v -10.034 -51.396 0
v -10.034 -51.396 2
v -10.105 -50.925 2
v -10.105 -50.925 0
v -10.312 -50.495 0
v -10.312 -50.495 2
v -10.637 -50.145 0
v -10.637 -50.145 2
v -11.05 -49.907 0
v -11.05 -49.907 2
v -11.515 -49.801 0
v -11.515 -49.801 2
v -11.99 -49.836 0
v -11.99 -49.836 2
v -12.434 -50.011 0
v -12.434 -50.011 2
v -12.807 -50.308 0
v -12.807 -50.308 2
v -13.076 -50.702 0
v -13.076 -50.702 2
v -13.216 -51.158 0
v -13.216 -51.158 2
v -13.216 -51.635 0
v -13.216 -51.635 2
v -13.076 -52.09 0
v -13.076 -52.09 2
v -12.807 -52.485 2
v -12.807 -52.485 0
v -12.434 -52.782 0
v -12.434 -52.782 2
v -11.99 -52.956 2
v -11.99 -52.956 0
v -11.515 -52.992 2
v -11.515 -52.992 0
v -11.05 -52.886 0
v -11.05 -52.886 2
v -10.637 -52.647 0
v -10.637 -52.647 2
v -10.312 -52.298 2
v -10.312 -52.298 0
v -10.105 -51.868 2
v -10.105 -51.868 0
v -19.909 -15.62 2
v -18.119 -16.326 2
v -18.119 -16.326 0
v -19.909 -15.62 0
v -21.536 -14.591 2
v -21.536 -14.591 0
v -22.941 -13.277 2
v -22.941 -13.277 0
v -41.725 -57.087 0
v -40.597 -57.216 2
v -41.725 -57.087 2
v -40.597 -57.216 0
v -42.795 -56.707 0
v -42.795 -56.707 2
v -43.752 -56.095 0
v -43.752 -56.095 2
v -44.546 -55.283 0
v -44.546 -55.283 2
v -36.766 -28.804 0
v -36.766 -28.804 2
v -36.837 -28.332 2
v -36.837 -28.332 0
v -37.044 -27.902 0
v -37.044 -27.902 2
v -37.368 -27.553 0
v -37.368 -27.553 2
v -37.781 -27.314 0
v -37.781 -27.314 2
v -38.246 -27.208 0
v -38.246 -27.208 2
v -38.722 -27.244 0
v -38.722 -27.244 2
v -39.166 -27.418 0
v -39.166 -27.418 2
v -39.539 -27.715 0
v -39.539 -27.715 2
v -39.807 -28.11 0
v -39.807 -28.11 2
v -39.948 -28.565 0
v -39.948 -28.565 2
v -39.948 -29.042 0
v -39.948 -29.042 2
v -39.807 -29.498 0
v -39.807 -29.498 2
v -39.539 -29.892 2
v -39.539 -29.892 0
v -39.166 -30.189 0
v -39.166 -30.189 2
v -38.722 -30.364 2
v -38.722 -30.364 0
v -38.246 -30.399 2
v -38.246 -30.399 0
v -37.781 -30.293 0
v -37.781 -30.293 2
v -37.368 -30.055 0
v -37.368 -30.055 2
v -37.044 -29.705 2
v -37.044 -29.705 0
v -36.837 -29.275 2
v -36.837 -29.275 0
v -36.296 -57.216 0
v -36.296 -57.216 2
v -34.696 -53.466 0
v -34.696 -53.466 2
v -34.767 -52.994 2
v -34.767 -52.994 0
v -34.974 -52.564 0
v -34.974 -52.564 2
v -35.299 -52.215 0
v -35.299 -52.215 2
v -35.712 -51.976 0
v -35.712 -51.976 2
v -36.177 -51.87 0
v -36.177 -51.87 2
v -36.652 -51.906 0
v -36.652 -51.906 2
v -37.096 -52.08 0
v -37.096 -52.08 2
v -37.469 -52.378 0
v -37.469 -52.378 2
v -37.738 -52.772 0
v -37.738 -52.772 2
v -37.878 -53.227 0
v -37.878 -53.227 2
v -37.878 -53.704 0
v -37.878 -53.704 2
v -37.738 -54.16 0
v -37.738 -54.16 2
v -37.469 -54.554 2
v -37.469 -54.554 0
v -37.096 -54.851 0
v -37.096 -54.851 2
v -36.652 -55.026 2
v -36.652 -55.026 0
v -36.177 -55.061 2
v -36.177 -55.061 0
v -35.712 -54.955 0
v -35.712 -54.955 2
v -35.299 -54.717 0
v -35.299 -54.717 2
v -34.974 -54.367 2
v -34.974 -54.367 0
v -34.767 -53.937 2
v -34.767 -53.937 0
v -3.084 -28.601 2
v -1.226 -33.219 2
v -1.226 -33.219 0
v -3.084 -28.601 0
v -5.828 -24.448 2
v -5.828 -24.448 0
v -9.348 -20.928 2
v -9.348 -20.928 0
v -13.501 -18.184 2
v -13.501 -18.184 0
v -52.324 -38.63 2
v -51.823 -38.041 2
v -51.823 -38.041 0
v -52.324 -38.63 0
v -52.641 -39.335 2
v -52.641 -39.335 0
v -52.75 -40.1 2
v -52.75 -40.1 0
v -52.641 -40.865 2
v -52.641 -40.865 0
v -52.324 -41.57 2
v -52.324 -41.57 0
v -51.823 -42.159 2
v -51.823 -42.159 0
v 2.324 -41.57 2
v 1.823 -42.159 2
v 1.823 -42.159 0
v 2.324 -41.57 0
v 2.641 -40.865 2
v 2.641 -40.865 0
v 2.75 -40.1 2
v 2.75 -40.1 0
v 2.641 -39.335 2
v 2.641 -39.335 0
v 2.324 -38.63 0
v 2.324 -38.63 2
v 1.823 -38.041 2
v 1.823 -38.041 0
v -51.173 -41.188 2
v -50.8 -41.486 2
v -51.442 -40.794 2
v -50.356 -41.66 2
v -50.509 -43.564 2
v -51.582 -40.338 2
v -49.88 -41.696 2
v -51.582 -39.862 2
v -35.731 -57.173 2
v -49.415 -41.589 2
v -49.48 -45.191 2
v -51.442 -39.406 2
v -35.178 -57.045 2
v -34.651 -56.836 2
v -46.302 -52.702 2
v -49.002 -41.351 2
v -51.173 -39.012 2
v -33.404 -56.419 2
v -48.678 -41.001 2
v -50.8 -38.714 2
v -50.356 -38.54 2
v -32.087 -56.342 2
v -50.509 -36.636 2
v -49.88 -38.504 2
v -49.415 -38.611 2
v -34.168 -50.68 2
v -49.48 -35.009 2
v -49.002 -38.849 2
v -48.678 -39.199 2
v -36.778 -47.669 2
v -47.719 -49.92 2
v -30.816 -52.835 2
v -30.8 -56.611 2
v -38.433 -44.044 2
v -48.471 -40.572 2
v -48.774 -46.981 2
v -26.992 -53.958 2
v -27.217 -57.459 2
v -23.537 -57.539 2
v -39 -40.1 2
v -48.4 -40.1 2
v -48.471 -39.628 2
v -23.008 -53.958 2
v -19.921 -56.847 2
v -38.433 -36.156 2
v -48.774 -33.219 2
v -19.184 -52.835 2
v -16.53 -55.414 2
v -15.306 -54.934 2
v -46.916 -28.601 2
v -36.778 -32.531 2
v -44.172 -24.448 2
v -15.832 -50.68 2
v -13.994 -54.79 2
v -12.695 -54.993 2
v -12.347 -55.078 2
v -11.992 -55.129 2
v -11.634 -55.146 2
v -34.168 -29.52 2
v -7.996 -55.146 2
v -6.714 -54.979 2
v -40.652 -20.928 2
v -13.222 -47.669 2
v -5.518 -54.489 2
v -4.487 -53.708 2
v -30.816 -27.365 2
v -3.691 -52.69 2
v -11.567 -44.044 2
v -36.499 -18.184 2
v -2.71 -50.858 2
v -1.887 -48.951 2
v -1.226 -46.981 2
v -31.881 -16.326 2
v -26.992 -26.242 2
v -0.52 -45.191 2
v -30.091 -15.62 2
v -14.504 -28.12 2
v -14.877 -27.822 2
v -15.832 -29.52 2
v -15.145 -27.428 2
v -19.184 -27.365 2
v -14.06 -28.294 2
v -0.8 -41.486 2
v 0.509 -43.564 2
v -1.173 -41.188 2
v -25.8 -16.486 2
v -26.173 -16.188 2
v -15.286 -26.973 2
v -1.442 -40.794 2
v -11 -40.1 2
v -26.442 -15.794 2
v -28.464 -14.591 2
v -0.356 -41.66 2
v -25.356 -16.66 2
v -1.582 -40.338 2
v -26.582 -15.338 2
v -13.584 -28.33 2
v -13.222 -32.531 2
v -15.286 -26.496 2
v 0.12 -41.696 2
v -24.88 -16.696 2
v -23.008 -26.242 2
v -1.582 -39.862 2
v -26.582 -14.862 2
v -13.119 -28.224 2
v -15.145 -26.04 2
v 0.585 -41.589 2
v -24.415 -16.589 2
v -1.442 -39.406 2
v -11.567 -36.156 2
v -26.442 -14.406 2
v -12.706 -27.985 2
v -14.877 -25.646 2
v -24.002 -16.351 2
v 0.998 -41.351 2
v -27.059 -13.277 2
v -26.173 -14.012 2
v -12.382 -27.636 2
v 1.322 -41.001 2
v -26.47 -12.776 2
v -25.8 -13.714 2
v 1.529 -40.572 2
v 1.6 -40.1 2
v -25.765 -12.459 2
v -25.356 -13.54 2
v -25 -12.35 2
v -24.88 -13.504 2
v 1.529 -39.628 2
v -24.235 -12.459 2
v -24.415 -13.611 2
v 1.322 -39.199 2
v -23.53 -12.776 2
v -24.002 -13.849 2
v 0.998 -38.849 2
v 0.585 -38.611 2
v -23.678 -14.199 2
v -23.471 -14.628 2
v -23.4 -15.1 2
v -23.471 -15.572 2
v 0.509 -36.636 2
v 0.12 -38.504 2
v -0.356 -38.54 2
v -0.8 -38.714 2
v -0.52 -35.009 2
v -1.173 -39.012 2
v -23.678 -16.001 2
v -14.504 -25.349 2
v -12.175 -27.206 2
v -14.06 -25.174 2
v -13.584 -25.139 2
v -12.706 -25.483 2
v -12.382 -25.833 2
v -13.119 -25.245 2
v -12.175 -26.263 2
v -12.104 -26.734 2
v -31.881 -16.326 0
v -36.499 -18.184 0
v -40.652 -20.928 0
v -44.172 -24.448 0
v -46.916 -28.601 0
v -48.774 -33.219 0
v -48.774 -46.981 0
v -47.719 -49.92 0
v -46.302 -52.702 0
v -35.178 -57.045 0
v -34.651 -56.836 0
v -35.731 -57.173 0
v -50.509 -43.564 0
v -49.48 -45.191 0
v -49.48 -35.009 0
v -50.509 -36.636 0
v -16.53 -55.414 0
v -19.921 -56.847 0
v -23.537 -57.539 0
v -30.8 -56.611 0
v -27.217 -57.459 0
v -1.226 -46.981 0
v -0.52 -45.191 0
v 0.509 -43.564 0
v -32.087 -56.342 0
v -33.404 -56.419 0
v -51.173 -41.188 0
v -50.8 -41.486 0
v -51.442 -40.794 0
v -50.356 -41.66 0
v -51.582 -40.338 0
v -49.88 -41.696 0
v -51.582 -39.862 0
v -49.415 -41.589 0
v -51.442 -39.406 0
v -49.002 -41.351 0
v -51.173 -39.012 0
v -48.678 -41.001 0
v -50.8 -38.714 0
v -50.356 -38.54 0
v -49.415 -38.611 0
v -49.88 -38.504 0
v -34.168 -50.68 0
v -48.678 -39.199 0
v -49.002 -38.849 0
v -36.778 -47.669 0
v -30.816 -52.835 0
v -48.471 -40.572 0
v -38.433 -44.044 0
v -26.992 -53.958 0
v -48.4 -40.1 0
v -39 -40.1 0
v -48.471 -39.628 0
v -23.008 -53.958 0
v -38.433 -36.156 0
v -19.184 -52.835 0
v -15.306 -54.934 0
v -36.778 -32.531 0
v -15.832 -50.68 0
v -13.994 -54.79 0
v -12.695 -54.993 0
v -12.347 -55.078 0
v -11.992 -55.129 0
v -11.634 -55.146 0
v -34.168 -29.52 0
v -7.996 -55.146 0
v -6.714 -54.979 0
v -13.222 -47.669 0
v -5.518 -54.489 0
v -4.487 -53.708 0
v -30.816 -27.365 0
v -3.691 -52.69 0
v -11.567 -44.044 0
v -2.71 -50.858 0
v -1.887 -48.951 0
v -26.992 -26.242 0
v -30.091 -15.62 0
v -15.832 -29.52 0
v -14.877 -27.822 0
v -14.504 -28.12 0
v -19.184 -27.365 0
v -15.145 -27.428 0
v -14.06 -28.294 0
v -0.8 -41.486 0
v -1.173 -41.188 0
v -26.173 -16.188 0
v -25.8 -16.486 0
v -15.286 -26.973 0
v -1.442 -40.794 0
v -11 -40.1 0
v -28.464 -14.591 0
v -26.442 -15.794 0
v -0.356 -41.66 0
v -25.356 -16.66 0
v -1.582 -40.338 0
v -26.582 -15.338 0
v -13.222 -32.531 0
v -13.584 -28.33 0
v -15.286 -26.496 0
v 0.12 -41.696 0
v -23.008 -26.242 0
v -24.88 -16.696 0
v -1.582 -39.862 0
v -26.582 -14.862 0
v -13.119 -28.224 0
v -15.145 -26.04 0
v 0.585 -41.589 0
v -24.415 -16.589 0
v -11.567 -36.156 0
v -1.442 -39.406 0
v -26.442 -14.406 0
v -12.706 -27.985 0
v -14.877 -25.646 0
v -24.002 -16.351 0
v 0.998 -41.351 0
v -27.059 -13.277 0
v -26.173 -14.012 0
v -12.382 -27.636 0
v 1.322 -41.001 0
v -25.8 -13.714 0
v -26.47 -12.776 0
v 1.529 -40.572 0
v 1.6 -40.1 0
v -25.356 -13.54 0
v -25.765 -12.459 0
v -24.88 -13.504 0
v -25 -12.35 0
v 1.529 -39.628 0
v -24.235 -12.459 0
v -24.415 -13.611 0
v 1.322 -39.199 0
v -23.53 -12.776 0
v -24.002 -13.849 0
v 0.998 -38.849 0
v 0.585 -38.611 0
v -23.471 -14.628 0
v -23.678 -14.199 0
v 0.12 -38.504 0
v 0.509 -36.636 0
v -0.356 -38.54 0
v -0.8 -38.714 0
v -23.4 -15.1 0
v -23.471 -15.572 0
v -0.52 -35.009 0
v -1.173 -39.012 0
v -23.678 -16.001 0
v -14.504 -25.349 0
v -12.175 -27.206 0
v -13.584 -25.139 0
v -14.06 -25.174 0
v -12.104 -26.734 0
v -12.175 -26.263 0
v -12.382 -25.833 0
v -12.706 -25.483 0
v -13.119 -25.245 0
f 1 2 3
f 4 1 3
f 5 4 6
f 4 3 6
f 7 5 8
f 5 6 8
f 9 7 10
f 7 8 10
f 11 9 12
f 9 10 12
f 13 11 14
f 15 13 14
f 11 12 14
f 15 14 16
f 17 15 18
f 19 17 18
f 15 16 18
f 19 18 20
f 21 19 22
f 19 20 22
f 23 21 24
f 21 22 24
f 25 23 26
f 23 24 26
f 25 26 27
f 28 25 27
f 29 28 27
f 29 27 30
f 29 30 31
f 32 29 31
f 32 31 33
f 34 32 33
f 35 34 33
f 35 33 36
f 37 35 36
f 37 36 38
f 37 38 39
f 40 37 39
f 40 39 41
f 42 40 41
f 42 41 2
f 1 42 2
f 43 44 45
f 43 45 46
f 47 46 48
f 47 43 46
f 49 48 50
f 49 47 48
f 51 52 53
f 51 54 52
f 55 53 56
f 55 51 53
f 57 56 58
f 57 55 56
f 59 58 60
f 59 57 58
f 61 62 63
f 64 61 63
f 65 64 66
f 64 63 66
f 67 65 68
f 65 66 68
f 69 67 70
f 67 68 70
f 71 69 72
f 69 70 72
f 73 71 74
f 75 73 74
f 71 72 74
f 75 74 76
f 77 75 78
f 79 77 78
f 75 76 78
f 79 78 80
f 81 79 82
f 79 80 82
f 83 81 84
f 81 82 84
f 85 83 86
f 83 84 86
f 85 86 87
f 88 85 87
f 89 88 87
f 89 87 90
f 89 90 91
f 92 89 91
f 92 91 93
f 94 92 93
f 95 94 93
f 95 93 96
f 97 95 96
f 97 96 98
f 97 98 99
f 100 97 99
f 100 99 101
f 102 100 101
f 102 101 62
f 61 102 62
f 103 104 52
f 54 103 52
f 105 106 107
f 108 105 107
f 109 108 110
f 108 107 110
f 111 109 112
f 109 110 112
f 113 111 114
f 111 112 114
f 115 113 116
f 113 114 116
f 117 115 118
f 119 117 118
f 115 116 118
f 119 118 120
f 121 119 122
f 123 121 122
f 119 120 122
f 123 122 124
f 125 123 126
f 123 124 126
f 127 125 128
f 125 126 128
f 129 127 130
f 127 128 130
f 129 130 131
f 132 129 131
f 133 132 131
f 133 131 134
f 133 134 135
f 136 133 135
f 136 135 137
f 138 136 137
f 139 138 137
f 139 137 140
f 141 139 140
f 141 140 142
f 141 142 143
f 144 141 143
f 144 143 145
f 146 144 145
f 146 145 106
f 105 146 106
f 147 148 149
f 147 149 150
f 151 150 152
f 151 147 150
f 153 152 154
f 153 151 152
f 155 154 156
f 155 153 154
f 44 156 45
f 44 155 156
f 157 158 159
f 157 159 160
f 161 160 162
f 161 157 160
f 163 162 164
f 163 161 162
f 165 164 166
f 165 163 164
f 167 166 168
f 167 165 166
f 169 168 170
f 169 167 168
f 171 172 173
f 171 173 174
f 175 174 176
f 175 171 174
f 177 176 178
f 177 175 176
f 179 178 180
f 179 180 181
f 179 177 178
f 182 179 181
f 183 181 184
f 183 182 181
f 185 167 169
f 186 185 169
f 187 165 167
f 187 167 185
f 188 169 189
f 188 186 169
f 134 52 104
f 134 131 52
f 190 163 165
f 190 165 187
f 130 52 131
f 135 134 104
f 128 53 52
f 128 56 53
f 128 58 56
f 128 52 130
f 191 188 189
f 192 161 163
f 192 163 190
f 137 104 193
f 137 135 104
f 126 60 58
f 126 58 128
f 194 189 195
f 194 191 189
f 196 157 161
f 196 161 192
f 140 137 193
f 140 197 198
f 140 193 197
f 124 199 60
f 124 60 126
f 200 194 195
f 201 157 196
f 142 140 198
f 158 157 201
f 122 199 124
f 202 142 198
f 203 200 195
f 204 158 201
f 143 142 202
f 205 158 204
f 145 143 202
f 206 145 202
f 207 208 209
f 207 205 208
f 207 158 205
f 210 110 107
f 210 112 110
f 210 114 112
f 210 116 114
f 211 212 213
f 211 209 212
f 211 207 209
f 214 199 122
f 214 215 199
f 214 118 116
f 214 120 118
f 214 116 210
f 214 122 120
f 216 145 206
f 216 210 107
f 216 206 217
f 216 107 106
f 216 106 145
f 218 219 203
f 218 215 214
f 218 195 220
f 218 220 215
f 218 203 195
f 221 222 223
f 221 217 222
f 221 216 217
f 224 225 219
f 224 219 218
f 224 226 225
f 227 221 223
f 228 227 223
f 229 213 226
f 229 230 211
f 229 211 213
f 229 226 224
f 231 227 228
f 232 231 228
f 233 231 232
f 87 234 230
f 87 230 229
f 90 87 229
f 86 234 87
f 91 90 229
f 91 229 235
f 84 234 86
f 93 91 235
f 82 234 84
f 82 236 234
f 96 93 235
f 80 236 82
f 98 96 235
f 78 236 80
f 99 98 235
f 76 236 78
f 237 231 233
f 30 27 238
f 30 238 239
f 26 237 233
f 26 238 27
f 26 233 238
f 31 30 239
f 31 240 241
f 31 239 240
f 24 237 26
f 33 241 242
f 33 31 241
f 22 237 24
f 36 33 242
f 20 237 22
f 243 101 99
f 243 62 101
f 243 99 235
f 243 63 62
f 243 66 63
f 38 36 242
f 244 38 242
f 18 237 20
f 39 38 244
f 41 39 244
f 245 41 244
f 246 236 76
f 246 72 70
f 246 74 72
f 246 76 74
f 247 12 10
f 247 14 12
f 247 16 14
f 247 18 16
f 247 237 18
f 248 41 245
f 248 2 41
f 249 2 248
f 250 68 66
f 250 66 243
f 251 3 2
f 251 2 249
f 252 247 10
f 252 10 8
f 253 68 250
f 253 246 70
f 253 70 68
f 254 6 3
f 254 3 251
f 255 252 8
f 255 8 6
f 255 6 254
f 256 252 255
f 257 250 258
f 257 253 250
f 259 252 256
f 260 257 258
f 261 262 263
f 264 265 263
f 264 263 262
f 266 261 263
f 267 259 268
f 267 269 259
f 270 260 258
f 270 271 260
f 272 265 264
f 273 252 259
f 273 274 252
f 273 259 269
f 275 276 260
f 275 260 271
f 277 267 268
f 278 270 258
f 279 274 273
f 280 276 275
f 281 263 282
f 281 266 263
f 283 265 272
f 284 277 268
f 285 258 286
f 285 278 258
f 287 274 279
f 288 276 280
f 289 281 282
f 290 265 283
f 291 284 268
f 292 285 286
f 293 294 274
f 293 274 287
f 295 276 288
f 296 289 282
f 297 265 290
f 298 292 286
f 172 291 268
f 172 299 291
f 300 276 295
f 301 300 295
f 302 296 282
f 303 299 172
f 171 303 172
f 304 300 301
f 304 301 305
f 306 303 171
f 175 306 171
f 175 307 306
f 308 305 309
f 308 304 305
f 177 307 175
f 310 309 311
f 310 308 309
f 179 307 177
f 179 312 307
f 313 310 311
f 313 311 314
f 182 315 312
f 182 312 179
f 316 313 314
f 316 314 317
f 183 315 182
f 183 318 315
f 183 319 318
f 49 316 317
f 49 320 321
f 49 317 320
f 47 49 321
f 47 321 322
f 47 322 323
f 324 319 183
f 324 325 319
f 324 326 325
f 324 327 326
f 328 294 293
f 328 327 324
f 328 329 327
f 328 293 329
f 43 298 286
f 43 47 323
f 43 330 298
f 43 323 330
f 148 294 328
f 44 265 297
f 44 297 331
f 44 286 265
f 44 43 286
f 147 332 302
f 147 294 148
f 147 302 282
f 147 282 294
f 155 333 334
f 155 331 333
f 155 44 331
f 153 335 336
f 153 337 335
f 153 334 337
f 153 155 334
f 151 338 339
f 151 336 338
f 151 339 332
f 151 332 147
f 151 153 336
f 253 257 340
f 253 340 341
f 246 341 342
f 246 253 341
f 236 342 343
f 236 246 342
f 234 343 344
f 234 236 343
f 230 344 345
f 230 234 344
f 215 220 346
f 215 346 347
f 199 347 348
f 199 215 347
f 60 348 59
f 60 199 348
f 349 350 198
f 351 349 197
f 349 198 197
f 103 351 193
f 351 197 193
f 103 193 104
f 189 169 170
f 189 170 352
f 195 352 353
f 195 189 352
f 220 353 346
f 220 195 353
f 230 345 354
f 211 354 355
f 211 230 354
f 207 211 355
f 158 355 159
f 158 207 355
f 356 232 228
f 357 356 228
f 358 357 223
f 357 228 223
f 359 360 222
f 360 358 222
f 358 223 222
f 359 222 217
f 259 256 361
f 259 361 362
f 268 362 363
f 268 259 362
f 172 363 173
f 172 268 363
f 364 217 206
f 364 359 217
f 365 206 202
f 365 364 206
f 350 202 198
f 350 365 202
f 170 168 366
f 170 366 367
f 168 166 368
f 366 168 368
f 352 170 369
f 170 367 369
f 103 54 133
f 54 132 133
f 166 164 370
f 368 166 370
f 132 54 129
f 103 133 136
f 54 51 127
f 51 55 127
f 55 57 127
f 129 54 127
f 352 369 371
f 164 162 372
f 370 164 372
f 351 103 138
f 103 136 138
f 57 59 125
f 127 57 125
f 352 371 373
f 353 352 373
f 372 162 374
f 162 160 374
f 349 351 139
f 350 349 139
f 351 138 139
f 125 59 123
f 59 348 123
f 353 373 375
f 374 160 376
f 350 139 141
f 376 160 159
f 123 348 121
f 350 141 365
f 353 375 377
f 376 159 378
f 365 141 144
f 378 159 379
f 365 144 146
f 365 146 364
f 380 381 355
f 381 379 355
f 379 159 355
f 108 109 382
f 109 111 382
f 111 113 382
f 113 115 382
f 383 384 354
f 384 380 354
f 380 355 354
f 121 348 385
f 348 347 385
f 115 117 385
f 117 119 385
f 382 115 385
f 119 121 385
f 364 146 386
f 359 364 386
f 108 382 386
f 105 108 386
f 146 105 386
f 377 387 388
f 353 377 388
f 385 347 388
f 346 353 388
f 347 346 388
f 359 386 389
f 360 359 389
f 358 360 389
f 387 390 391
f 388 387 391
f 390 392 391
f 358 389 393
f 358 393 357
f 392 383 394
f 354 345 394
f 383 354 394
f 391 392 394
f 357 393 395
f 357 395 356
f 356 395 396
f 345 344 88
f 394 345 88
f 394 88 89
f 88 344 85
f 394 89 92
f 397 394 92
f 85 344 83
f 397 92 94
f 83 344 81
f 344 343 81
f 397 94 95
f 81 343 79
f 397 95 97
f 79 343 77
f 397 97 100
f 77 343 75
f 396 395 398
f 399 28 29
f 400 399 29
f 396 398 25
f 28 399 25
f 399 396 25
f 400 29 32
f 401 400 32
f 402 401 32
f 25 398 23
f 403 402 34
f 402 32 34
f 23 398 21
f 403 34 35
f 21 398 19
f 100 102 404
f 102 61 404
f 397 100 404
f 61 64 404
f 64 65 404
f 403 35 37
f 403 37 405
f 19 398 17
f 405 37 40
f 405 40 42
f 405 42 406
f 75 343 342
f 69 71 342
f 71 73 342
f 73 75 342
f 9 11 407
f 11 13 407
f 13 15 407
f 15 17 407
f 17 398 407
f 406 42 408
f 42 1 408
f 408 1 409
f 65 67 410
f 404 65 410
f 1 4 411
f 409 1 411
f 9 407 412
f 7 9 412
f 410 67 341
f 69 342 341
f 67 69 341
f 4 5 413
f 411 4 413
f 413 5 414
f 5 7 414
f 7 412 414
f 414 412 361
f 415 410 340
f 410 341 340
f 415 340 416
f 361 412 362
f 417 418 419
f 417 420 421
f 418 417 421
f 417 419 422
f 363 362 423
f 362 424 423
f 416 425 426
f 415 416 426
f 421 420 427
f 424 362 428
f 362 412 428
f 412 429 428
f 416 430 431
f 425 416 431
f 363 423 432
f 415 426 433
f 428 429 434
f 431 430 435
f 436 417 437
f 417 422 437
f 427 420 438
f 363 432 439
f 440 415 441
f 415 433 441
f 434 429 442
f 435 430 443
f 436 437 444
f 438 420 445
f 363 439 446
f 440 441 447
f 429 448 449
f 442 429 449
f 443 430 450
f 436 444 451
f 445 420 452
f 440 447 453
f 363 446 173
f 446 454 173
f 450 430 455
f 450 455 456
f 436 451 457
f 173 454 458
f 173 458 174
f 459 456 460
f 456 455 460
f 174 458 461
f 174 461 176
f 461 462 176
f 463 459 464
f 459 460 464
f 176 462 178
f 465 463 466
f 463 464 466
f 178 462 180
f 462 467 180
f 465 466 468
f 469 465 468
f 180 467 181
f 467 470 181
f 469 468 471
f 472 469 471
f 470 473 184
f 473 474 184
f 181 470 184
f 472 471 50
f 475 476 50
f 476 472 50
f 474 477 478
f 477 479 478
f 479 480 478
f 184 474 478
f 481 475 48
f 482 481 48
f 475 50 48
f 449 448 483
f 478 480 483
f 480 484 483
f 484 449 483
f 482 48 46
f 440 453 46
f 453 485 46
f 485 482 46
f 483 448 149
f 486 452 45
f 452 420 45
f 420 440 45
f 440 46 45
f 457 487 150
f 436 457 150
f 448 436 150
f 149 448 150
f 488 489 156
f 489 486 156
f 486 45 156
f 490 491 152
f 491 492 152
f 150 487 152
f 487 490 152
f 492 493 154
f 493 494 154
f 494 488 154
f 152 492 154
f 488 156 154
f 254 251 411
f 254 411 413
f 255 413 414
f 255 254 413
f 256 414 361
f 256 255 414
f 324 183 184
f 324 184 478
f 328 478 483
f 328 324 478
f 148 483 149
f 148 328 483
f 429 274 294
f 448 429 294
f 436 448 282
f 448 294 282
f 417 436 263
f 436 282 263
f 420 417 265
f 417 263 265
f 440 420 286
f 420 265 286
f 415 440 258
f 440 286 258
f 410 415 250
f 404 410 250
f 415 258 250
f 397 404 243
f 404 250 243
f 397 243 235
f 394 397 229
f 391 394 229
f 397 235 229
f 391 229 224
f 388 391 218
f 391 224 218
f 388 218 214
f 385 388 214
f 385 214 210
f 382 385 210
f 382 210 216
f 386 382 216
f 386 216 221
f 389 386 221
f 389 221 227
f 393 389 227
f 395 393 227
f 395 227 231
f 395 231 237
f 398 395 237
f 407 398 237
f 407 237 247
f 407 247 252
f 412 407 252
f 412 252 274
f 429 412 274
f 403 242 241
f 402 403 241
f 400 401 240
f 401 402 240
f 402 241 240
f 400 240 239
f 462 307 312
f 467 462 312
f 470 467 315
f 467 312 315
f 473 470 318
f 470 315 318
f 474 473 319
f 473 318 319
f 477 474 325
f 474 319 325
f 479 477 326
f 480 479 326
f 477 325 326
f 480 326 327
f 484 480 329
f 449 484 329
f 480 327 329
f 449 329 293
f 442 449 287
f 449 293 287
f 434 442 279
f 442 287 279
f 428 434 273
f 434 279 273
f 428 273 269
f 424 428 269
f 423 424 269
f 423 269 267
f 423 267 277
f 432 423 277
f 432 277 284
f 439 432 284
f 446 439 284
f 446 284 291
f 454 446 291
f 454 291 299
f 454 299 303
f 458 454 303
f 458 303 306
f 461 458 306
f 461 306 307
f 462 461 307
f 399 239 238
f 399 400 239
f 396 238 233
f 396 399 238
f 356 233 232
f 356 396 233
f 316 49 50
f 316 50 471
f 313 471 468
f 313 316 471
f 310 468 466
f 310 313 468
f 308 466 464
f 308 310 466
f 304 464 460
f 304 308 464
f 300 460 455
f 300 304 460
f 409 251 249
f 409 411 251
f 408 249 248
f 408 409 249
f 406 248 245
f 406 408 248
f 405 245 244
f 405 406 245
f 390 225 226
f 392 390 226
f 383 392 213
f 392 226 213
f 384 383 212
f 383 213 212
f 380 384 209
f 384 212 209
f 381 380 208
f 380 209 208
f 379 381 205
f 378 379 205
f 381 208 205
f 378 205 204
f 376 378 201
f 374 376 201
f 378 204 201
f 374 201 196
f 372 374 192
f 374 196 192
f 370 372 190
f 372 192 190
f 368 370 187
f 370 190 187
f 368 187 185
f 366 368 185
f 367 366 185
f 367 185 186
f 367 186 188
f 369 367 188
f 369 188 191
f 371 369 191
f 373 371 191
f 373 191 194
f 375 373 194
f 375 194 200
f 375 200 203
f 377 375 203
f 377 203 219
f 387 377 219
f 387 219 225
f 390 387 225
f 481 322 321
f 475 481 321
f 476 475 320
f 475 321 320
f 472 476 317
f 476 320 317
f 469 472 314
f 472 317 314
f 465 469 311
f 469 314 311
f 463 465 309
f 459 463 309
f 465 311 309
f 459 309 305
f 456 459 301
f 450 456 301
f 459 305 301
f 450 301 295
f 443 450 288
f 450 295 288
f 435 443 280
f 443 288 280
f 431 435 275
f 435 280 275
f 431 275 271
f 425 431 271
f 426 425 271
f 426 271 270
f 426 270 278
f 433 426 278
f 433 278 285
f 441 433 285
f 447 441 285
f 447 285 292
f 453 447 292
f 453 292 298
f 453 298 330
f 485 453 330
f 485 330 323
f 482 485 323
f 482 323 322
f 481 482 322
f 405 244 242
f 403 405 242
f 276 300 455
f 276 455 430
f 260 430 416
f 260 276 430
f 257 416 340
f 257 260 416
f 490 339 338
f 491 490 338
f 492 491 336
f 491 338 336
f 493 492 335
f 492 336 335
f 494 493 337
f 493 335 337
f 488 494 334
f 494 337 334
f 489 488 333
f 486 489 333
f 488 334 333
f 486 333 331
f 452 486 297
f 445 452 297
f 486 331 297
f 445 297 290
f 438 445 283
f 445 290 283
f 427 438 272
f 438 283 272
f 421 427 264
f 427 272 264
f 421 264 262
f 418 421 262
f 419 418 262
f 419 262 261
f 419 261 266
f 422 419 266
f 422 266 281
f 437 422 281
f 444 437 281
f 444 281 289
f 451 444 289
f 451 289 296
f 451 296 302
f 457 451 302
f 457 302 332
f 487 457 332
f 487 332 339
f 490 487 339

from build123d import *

# Parameters (mm, degrees)
SKETCH1_R           = 25
SKETCH1_R_2         = 3
BOSS_EXTRUDE1_DEPTH = 2
FILLET1_R           = 10
CUT_EXTRUDE1_DEPTH  = 3.0000001
SKETCH4_R           = 1.6
SKETCH4_R_2         = 14
CUT_EXTRUDE2_DEPTH  = 3.0000001
SKETCH6_R           = 1.6
CUT_EXTRUDE3_DEPTH  = 3.0000001
SKETCH7_OUTSIDE_W   = 73.426
SKETCH7_OUTSIDE_H   = 70.426
CUT_EXTRUDE4_DEPTH  = 10
CUT_EXTRUDE5_DEPTH  = 10
FILLET2_R           = 5


with BuildPart() as part:
    # Sketch1 → Boss-Extrude1 (new body)
    with BuildSketch(Plane.XY):
        with Locations((-25, -40.1)):
            Circle(SKETCH1_R)
        with Locations((-50, -40.1)):
            Circle(SKETCH1_R_2)
        with Locations((-50, -40.1)):
            Circle(SKETCH1_R_2)
        with Locations((-25, -40.1)):
            Circle(SKETCH1_R)
        with Locations((0, -40.1)):
            Circle(SKETCH1_R_2)
        with Locations((-25, -40.1)):
            Circle(SKETCH1_R)
        with Locations((-25, -15.1)):
            Circle(SKETCH1_R_2)
        with Locations((-50, -40.1)):
            Circle(SKETCH1_R_2)
        with Locations((-25, -40.1)):
            Circle(SKETCH1_R)
        with Locations((-25, -15.1)):
            Circle(SKETCH1_R_2)
        with Locations((-25, -15.1)):
            Circle(SKETCH1_R_2)
        with Locations((-25, -40.1)):
            Circle(SKETCH1_R)
        with Locations((-25, -40.1)):
            Circle(SKETCH1_R)
        with Locations((0, -40.1)):
            Circle(SKETCH1_R_2)
        with Locations((0, -40.1)):
            Circle(SKETCH1_R_2)
        with Locations((-25, -40.1)):
            Circle(SKETCH1_R)
    extrude(amount=BOSS_EXTRUDE1_DEPTH)

    # Fillet1
    fillet1_edges = [part.edges().sort_by_distance(p)[0] for p in [
        (-49.82, -37.105404869, 1),
        (-27.994595131, -15.28, 1),
        (-22.005404869, -15.28, 1),
        (-0.18, -37.105404869, 1),
        (-0.18, -43.094595131, 1),
        (-49.82, -43.094595131, 1),
    ]]
    fillet(fillet1_edges, radius=FILLET1_R)

    # Sketch3 → Cut-Extrude1 (cut, through all)
    with BuildSketch(Plane.XY.offset(2)):
        with BuildLine():
            ThreePointArc((-37.216735292, -29.767928139), (-37.401620542, -27.65468006), (-39.514868621, -27.83956531))
            ThreePointArc((-39.514868621, -27.83956531), (-39.329983371, -29.952813389), (-37.216735292, -29.767928139))
        make_face()
        with BuildLine():
            ThreePointArc((-35.332071861, -52.316735292), (-37.44531994, -52.501620542), (-37.26043469, -54.614868621))
            ThreePointArc((-37.26043469, -54.614868621), (-35.147186611, -54.429983371), (-35.332071861, -52.316735292))
        make_face()
        with BuildLine():
            ThreePointArc((-12.783264708, -50.432071861), (-12.598379458, -52.54531994), (-10.485131379, -52.36043469))
            ThreePointArc((-10.485131379, -52.36043469), (-10.670016629, -50.247186611), (-12.783264708, -50.432071861))
        make_face()
        with BuildLine():
            ThreePointArc((-14.667928139, -27.883264708), (-12.55468006, -27.698379458), (-12.73956531, -25.585131379))
            ThreePointArc((-12.73956531, -25.585131379), (-14.852813389, -25.770016629), (-14.667928139, -27.883264708))
        make_face()
        with BuildLine():
            ThreePointArc((-35.264995538, -31.48664603), (-33.61335397, -50.364995538), (-14.735004462, -48.71335397))
            ThreePointArc((-14.735004462, -48.71335397), (-16.38664603, -29.835004462), (-35.264995538, -31.48664603))
        make_face()
    extrude(amount=-CUT_EXTRUDE1_DEPTH, mode=Mode.SUBTRACT)

    # Sketch4 → Cut-Extrude2 (cut, through all)
    with BuildSketch(Plane.XY.offset(2)):
        with Locations((-36.296253275, -53.465801956)):
            Circle(SKETCH4_R)
        with Locations((-38.365801956, -28.803746725)):
            Circle(SKETCH4_R)
        with Locations((-13.703746725, -26.734198044)):
            Circle(SKETCH4_R)
        with Locations((-11.634198044, -51.396253275)):
            Circle(SKETCH4_R)
        with Locations((-25, -40.1)):
            Circle(SKETCH4_R_2)
    extrude(amount=-CUT_EXTRUDE2_DEPTH, mode=Mode.SUBTRACT)

    # Sketch6 → Cut-Extrude3 (cut, through all)
    with BuildSketch(Plane.XY.offset(2)):
        with Locations((-50, -40.1)):
            Circle(SKETCH6_R)
        with Locations((-25, -15.1)):
            Circle(SKETCH6_R)
        with Locations((0, -40.1)):
            Circle(SKETCH6_R)
    extrude(amount=-CUT_EXTRUDE3_DEPTH, mode=Mode.SUBTRACT)

    # Sketch7 outside → Cut-Extrude4 (cut)
    with BuildSketch(Plane.XY.offset(2)):
        with Locations((-25, -38.6)):
            Rectangle(SKETCH7_OUTSIDE_W, SKETCH7_OUTSIDE_H)
        with BuildLine():
            ThreePointArc((-31.881324829, -16.325857143), (-42.500892834, -22.599107166), (-48.774142857, -33.218675171))
            ThreePointArc((-48.774142857, -33.218675171), (-49.956443907, -35.846542569), (-51.823461538, -38.041484025))
            ThreePointArc((-51.823461538, -38.041484025), (-52.75, -40.1), (-51.823461538, -42.158515975))
            ThreePointArc((-51.823461538, -42.158515975), (-49.956443907, -44.353457431), (-48.774142857, -46.981324829))
            ThreePointArc((-48.774142857, -46.981324829), (-25, -64.85), (-1.225857143, -46.981324829))
            ThreePointArc((-1.225857143, -46.981324829), (-0.043556093, -44.353457431), (1.823461538, -42.158515975))
            ThreePointArc((1.823461538, -42.158515975), (2.75, -40.1), (1.823461538, -38.041484025))
            ThreePointArc((1.823461538, -38.041484025), (-0.043556093, -35.846542569), (-1.225857143, -33.218675171))
            ThreePointArc((-1.225857143, -33.218675171), (-7.499107166, -22.599107166), (-18.118675171, -16.325857143))
            ThreePointArc((-18.118675171, -16.325857143), (-20.746542569, -15.143556093), (-22.941484025, -13.276538462))
            ThreePointArc((-22.941484025, -13.276538462), (-25, -12.35), (-27.058515975, -13.276538462))
            ThreePointArc((-27.058515975, -13.276538462), (-29.253457431, -15.143556093), (-31.881324829, -16.325857143))
        make_face(mode=Mode.SUBTRACT)
    extrude(amount=-CUT_EXTRUDE4_DEPTH, mode=Mode.SUBTRACT)

    # Sketch8 → Cut-Extrude5 (cut)
    with BuildSketch(Plane.XY.offset(2)):
        with BuildLine():
            ThreePointArc((-33.189286906, -55.565625754), (-34.537253452, -56.777662403), (-36.296253275, -57.215801956))
            Line((-36.296253275, -57.215801956), (-42.877690662, -57.215801956))
            ThreePointArc((-42.877690662, -57.215801956), (-23.637222782, -64.812453101), (-5.348721101, -55.146253275))
            Line((-5.348721101, -55.146253275), (-11.634198044, -55.146253275))
            ThreePointArc((-11.634198044, -55.146253275), (-13.110091293, -54.843605755), (-14.347757645, -53.984514137))
            ThreePointArc((-14.347757645, -53.984514137), (-23.536608094, -57.538706492), (-33.189286906, -55.565625754))
        make_face()
    extrude(amount=-CUT_EXTRUDE5_DEPTH, mode=Mode.SUBTRACT)

    # Fillet2
    fillet2_edges = [part.edges().sort_by_distance(p)[0] for p in [
        (-42.877690662, -57.215801956, 1),
        (-5.348721101, -55.146253275, 1),
        (-14.347757645, -53.984514137, 1),
        (-33.189286906, -55.565625754, 1),
    ]]
    fillet(fillet2_edges, radius=FILLET2_R)


solid = part.part
